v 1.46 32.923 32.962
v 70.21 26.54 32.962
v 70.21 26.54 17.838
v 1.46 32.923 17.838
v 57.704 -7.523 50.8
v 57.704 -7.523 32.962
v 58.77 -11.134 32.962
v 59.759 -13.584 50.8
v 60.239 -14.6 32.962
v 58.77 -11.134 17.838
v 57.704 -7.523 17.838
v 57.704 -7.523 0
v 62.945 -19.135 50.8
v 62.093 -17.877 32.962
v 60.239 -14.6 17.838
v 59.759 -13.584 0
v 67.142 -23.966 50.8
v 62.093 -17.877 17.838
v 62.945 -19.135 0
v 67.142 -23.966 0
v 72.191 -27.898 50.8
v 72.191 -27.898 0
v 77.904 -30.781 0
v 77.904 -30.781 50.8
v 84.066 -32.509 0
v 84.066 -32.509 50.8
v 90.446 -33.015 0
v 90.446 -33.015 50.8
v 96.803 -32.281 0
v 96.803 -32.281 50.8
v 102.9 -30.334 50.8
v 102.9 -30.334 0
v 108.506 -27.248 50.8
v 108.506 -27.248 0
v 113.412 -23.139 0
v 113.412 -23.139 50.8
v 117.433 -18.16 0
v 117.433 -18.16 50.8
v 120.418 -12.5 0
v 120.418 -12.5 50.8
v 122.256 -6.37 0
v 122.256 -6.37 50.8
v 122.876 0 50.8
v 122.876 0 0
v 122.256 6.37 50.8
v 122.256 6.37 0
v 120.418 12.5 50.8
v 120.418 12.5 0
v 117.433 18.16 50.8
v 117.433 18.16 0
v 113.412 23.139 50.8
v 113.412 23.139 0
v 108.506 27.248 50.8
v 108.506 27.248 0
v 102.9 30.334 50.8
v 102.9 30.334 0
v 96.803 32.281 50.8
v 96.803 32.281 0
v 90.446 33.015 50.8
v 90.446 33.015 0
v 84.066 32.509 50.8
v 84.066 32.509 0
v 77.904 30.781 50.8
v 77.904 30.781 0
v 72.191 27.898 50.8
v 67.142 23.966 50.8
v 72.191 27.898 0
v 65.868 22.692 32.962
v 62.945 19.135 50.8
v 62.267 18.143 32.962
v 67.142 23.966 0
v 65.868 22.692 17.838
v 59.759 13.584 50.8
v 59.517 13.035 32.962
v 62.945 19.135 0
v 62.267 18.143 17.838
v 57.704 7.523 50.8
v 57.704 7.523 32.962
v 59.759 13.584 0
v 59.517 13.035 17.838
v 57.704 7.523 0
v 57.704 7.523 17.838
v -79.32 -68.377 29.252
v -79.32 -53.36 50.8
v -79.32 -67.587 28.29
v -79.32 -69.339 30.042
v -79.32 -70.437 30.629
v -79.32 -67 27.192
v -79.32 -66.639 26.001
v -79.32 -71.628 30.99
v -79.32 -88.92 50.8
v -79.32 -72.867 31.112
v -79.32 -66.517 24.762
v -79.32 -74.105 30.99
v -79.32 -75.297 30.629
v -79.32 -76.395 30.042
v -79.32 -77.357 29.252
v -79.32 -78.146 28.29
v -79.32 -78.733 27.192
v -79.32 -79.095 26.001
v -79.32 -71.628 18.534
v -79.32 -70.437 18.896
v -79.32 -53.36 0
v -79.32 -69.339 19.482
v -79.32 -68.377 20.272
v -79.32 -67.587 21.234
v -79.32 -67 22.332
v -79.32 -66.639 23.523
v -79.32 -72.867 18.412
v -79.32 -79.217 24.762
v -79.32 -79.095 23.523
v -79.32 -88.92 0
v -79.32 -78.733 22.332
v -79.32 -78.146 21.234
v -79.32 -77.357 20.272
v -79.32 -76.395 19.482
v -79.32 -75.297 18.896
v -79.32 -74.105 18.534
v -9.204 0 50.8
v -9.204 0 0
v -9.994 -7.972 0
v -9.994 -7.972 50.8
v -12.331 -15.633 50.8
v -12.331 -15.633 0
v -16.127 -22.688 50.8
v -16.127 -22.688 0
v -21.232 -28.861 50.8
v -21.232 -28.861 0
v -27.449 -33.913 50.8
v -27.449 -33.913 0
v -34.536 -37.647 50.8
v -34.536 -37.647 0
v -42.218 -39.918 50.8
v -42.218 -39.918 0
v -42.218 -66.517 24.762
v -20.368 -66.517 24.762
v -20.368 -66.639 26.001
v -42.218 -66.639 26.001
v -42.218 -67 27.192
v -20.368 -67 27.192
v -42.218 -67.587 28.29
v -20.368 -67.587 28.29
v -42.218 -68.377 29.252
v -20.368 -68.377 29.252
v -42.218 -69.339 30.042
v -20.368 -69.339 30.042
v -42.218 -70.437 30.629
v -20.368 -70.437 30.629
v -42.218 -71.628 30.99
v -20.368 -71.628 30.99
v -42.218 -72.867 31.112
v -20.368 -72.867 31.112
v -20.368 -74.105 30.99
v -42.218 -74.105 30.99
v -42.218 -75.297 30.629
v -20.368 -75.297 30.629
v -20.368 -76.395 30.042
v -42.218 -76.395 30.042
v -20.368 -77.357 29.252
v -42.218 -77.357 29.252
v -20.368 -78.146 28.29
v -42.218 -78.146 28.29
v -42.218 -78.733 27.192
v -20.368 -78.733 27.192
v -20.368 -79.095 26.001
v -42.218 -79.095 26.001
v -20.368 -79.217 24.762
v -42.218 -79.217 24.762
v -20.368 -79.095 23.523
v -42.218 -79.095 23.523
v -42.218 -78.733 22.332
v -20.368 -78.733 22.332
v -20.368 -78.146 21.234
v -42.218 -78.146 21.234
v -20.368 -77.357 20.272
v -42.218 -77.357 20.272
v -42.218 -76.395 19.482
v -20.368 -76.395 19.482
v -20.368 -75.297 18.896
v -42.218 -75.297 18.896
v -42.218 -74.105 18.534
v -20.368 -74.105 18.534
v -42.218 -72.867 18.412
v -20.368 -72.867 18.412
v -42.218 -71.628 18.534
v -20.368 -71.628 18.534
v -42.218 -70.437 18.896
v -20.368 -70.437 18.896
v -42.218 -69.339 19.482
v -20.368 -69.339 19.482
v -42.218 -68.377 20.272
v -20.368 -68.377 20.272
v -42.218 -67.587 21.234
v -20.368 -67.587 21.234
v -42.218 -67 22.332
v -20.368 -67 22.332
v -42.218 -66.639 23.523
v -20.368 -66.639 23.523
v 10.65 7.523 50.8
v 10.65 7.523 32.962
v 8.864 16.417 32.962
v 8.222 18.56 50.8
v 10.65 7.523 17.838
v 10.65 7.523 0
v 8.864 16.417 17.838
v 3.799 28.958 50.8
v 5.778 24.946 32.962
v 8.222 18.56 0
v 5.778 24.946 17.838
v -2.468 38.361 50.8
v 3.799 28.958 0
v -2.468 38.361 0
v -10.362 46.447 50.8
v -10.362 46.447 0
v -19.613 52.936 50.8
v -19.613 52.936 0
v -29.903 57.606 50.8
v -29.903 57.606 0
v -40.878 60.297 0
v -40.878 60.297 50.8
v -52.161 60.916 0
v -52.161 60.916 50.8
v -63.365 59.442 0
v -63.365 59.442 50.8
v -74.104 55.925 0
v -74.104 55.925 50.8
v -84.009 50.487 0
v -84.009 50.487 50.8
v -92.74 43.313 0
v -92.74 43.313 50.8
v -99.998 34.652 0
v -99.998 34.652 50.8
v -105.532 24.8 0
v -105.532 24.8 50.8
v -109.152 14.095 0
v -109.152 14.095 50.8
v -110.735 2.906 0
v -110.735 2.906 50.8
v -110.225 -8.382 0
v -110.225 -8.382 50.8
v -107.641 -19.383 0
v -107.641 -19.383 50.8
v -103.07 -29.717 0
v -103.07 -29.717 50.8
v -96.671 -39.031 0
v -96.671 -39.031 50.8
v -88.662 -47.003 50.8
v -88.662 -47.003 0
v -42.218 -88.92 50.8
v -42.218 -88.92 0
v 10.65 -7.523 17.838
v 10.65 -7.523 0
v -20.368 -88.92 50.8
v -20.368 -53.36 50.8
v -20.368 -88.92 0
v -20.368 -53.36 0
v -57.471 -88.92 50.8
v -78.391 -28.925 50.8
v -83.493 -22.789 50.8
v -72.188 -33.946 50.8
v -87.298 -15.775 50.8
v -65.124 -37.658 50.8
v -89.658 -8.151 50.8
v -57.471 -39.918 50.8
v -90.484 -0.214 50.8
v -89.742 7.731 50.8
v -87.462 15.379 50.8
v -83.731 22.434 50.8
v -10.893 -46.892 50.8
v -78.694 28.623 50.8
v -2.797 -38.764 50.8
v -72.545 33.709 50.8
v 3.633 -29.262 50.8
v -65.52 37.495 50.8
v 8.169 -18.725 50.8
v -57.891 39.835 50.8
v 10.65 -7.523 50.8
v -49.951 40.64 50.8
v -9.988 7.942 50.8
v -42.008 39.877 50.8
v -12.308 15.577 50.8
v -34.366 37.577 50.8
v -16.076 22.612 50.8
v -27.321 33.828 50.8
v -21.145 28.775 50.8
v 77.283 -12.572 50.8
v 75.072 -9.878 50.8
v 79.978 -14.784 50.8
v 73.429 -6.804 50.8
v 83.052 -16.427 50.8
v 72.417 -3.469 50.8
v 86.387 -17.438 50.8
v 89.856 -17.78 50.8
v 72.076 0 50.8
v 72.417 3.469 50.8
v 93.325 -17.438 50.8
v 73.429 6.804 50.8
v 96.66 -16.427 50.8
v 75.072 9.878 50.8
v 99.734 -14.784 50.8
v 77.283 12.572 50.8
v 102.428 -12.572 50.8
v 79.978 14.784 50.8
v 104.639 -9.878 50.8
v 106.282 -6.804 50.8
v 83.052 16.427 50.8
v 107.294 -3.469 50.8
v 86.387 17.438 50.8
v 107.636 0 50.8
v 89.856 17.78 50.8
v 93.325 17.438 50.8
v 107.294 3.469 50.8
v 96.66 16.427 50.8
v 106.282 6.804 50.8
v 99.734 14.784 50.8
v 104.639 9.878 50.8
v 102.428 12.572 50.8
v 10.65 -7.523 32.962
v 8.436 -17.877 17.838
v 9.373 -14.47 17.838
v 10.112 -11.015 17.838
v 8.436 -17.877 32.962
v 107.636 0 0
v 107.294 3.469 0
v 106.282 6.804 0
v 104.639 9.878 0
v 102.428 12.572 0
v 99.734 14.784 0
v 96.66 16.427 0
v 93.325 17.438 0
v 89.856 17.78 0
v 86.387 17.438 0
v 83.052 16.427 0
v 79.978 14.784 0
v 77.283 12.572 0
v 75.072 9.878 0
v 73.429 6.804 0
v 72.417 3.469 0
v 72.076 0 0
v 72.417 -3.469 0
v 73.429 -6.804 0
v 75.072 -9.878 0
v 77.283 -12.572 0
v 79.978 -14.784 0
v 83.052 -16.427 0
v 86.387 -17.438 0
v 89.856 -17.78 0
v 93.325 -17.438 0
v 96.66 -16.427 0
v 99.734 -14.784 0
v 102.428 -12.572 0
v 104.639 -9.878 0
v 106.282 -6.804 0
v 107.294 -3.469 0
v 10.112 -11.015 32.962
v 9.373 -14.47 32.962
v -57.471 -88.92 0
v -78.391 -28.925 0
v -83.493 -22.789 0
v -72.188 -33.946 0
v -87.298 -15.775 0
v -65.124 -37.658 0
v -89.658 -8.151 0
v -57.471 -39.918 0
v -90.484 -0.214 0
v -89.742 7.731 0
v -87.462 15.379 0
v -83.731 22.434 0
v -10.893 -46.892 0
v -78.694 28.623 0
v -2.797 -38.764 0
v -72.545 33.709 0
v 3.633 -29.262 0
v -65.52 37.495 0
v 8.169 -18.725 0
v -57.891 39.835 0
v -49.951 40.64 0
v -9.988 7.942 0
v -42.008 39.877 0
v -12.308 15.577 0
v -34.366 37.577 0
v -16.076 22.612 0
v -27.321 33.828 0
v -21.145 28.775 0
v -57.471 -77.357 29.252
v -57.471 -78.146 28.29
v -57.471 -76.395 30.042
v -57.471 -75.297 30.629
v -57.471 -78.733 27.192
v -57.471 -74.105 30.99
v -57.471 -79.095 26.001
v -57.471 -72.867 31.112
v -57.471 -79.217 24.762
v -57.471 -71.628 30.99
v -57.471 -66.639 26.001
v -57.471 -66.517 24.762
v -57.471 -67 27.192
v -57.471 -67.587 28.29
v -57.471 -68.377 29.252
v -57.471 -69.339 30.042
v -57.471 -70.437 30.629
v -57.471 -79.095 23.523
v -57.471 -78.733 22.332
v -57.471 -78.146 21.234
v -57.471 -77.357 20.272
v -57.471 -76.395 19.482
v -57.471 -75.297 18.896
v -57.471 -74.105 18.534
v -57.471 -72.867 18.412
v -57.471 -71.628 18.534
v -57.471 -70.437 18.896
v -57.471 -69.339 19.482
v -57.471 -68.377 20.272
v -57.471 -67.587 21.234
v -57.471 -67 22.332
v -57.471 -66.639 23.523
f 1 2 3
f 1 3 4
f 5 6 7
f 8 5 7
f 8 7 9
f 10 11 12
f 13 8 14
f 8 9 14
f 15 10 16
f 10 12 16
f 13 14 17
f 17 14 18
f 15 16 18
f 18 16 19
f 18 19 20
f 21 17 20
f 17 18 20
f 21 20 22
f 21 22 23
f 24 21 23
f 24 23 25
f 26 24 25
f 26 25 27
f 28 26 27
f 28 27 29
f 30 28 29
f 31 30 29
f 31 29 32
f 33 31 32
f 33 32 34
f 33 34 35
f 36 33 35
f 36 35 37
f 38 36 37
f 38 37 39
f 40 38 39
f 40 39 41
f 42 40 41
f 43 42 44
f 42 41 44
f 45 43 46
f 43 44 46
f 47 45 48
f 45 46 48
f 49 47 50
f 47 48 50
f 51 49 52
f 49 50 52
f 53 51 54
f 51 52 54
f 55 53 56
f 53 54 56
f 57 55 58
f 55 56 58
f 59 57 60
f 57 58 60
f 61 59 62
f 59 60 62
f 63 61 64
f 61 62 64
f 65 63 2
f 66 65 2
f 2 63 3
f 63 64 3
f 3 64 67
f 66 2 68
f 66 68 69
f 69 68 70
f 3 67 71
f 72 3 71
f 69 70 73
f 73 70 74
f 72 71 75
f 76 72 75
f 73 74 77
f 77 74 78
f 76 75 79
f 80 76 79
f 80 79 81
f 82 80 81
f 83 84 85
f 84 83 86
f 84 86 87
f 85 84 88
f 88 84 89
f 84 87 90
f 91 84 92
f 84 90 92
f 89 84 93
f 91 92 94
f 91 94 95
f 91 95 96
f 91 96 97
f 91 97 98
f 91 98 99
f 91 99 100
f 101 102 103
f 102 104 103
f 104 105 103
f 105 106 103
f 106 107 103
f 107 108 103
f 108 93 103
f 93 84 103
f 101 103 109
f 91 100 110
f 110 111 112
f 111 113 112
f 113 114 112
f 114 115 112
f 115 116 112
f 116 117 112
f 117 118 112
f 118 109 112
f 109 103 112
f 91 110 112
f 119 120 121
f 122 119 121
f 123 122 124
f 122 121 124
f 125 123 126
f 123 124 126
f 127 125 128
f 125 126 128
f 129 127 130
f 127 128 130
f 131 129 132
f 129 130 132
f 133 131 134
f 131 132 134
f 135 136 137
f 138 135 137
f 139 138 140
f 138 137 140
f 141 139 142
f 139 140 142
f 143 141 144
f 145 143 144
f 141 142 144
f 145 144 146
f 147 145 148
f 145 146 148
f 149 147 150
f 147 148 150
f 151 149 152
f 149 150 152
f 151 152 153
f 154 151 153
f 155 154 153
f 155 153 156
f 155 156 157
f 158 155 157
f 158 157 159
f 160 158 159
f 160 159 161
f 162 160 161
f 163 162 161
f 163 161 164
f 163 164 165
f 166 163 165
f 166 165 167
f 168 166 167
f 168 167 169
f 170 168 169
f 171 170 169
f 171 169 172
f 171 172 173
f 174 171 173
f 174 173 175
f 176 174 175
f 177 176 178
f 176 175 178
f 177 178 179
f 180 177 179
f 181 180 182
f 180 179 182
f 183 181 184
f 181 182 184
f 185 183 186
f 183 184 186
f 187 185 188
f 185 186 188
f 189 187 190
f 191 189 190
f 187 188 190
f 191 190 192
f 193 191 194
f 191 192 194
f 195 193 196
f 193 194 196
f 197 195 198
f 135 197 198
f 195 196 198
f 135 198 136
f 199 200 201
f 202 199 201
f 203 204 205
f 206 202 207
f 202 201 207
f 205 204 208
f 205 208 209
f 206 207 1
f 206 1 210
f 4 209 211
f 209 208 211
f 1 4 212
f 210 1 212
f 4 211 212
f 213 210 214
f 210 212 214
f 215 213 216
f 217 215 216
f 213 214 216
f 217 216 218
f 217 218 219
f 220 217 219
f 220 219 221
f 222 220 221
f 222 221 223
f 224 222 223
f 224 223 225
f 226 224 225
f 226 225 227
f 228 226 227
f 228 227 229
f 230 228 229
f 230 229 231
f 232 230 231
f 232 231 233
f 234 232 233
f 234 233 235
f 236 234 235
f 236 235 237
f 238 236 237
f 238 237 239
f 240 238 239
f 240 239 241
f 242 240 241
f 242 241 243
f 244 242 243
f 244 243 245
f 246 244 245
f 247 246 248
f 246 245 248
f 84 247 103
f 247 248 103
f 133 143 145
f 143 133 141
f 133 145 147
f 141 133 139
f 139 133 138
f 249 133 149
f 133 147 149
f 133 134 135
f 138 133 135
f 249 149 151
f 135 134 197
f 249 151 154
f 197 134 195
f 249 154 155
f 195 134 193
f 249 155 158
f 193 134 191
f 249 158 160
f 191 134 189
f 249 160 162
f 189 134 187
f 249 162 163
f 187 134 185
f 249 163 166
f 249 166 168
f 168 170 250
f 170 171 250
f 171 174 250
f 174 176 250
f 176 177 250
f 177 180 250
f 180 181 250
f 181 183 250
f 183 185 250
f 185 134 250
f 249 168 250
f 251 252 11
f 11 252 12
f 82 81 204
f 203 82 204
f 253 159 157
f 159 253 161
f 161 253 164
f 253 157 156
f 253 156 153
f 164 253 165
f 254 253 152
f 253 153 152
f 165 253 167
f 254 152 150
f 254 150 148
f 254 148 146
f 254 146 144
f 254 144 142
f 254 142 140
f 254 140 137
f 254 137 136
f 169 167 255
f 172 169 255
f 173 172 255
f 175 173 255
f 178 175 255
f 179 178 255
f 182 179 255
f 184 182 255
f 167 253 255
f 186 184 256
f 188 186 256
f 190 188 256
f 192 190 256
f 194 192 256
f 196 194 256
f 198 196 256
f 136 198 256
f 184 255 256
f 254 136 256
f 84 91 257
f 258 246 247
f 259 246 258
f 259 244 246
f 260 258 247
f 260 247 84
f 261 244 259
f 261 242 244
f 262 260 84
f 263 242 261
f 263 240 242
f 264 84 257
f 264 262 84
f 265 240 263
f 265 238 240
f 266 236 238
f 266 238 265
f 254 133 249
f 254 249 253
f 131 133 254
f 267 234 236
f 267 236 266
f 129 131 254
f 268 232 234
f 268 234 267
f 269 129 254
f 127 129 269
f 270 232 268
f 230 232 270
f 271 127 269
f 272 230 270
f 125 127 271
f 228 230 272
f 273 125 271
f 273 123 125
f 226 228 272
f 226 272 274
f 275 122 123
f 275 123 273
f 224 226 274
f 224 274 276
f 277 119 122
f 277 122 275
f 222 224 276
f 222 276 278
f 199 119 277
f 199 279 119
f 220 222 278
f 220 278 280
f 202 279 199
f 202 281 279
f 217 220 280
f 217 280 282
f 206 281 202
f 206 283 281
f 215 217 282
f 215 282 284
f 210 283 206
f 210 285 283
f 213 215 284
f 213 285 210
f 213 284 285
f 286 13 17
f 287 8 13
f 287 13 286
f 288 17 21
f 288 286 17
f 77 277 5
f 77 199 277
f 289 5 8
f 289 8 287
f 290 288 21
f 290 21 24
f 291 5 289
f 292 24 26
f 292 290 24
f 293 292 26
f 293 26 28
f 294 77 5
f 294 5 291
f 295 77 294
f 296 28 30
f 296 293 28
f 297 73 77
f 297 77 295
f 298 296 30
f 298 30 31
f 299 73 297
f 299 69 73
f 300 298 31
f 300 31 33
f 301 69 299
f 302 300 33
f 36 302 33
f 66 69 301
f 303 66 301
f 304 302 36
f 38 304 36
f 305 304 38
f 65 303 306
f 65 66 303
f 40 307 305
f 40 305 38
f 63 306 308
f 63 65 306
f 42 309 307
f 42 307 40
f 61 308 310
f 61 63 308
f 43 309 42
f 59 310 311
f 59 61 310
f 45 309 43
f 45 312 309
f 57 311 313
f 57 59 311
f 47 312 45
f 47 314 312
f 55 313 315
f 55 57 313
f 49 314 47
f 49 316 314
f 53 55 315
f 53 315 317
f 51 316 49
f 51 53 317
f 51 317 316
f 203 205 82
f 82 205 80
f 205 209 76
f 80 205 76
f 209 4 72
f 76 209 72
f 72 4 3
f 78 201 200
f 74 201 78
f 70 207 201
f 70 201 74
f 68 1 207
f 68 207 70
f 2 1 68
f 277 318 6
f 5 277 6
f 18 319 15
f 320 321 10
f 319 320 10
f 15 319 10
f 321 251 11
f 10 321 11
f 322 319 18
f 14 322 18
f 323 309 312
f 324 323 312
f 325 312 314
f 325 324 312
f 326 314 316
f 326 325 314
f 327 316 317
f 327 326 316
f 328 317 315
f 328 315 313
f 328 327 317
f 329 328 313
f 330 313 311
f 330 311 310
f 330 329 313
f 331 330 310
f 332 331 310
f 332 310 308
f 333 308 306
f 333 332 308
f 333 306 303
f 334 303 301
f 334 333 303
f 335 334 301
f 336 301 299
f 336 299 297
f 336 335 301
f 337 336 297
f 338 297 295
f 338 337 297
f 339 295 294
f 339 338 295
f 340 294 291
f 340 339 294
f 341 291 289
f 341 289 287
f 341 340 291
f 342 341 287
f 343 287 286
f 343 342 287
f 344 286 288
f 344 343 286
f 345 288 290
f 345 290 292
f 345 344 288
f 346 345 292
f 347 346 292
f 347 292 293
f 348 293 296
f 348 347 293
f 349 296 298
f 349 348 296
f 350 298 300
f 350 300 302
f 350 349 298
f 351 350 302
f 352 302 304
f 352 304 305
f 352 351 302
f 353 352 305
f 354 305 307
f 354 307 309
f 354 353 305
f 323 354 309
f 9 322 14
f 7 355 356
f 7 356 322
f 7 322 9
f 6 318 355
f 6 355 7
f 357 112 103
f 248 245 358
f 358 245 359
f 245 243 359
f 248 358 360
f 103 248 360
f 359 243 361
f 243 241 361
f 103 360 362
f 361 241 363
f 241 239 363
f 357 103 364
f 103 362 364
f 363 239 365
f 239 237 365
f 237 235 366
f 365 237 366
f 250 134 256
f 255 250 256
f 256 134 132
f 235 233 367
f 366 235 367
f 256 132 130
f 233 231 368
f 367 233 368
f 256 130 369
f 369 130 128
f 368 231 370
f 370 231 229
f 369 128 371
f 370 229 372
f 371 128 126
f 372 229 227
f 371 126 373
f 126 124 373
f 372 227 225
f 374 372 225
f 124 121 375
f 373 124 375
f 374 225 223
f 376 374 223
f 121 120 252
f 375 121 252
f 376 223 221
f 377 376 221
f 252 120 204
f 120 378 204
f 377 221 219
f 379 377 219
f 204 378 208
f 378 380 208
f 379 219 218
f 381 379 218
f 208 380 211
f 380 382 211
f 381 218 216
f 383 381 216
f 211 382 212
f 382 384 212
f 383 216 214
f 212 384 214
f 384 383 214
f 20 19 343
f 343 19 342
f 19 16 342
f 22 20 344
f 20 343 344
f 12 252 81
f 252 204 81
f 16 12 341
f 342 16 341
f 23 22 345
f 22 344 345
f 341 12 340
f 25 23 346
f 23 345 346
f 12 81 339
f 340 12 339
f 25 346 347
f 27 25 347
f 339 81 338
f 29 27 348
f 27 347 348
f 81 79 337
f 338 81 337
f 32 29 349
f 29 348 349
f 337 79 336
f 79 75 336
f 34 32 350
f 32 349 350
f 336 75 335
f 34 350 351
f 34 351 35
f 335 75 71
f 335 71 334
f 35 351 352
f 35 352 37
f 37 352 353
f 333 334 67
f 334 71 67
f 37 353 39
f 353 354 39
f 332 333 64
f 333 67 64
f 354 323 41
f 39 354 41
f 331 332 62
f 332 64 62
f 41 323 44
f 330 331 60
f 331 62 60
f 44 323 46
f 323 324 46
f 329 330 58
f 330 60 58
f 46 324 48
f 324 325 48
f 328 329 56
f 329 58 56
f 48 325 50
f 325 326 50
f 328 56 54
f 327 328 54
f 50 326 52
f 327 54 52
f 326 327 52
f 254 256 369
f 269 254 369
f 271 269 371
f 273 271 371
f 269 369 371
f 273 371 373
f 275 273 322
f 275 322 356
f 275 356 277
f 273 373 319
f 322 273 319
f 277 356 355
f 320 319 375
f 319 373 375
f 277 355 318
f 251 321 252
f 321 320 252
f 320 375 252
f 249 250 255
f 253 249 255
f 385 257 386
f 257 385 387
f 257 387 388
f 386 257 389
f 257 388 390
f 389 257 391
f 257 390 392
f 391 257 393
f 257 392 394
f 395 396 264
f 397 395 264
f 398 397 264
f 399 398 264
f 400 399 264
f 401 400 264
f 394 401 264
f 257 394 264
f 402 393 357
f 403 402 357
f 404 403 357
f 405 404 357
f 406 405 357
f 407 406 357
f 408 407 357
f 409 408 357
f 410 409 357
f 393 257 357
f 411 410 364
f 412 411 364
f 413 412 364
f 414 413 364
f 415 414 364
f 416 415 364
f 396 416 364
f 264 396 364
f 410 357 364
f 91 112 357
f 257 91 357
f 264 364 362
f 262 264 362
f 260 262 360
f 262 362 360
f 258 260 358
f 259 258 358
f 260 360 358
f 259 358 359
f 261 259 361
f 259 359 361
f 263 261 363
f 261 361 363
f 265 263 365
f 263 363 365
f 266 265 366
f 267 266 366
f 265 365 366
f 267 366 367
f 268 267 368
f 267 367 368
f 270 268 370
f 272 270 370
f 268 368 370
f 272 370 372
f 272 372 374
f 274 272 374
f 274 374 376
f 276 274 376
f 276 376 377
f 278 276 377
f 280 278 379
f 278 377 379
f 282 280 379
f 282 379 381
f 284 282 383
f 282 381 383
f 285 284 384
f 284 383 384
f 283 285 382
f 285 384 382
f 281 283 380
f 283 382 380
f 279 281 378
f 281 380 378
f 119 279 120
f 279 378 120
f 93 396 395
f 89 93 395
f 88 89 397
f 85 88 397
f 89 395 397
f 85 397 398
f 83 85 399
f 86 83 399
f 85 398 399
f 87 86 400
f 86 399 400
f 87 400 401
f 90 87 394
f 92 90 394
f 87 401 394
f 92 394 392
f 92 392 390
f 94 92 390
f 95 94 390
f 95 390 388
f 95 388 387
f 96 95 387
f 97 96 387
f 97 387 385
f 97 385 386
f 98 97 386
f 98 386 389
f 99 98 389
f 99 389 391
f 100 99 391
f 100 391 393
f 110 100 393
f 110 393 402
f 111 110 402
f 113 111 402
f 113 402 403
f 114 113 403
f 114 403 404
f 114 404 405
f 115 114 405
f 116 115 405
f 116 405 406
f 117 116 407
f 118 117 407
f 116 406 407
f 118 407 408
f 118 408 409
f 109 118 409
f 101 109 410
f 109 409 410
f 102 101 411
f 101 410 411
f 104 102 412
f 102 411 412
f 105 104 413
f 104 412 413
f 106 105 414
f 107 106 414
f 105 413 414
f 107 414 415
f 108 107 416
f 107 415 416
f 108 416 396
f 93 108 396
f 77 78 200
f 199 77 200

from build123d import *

# Parameters (mm, degrees)
SKETCH1_R           = 17.78
BOSS_EXTRUDE2_DEPTH = 50.8
SKETCH2_W           = 73.862630268
SKETCH2_H           = 15.124217288
BOSS_EXTRUDE3_DEPTH = 25.4
CUT_EXTRUDE1_DEPTH  = 50.8
SKETCH4_R           = 6.35
CUT_EXTRUDE2_DEPTH  = 63.5


with BuildPart() as part:
    # Sketch1 → Boss-Extrude2 (new body)
    with BuildSketch(Plane.XY):
        with BuildLine():
            ThreePointArc((-9.204181185, 0), (-18.526895851, -25.90052585), (-42.217824852, -39.918019604))
            Line((-42.217824852, -39.918019604), (-42.217824852, -88.920040919))
            Line((-42.217824852, -88.920040919), (-20.368298956, -88.920040919))
            Line((-20.368298956, -88.920040919), (-20.368298956, -53.360040919))
            ThreePointArc((-20.368298956, -53.360040919), (0.642357728, -34.164762381), (10.649776088, -7.523478812))
            Line((10.649776088, -7.523478812), (57.70433881, -7.523478812))
            ThreePointArc((57.70433881, -7.523478812), (122.875818815, 0), (57.70433881, 7.523478812))
            Line((57.70433881, 7.523478812), (10.649776088, 7.523478812))
            ThreePointArc((10.649776088, 7.523478812), (-84.008943566, 50.486538913), (-79.320063413, -53.360040919))
            Line((-79.320063413, -53.360040919), (-79.320063413, -88.920040919))
            Line((-79.320063413, -88.920040919), (-57.470537518, -88.920040919))
            Line((-57.470537518, -88.920040919), (-57.470537518, -39.918019604))
            ThreePointArc((-57.470537518, -39.918019604), (-75.744707035, 31.317285334), (-9.204181185, 0))
        make_face()
        with Locations((89.855818815, 0)):
            Circle(SKETCH1_R, mode=Mode.SUBTRACT)
    extrude(amount=BOSS_EXTRUDE2_DEPTH)

    # Sketch2 → Boss-Extrude3 (add, symmetric)
    with BuildSketch(Plane(origin=(0, 7.523478812, 0), x_dir=(1, 0, 0), z_dir=(0, 1, 0))):
        with Locations((33.279016798, -25.4)):
            Rectangle(SKETCH2_W, SKETCH2_H)
    extrude(amount=BOSS_EXTRUDE3_DEPTH, both=True)

    # Sketch3 → Cut-Extrude1 (cut)
    with BuildSketch(Plane.XY.offset(32.962108644)):
        Polygon((70.210331932, 26.540068672), (1.460459374, 32.923478812), (70.210331932, 32.923478812), align=None)
    extrude(amount=-CUT_EXTRUDE1_DEPTH, mode=Mode.SUBTRACT)

    # Sketch4 → Cut-Extrude2 (cut)
    with BuildSketch(Plane(origin=(-20.368298956, 0, 0), x_dir=(0, 0, -1), z_dir=(1, 0, 0))):
        with Locations(Location((-24.762227367, -72.866633354, 0), (0, 0, 90))):
            Circle(SKETCH4_R)
    extrude(amount=-CUT_EXTRUDE2_DEPTH, mode=Mode.SUBTRACT)


solid = part.part
